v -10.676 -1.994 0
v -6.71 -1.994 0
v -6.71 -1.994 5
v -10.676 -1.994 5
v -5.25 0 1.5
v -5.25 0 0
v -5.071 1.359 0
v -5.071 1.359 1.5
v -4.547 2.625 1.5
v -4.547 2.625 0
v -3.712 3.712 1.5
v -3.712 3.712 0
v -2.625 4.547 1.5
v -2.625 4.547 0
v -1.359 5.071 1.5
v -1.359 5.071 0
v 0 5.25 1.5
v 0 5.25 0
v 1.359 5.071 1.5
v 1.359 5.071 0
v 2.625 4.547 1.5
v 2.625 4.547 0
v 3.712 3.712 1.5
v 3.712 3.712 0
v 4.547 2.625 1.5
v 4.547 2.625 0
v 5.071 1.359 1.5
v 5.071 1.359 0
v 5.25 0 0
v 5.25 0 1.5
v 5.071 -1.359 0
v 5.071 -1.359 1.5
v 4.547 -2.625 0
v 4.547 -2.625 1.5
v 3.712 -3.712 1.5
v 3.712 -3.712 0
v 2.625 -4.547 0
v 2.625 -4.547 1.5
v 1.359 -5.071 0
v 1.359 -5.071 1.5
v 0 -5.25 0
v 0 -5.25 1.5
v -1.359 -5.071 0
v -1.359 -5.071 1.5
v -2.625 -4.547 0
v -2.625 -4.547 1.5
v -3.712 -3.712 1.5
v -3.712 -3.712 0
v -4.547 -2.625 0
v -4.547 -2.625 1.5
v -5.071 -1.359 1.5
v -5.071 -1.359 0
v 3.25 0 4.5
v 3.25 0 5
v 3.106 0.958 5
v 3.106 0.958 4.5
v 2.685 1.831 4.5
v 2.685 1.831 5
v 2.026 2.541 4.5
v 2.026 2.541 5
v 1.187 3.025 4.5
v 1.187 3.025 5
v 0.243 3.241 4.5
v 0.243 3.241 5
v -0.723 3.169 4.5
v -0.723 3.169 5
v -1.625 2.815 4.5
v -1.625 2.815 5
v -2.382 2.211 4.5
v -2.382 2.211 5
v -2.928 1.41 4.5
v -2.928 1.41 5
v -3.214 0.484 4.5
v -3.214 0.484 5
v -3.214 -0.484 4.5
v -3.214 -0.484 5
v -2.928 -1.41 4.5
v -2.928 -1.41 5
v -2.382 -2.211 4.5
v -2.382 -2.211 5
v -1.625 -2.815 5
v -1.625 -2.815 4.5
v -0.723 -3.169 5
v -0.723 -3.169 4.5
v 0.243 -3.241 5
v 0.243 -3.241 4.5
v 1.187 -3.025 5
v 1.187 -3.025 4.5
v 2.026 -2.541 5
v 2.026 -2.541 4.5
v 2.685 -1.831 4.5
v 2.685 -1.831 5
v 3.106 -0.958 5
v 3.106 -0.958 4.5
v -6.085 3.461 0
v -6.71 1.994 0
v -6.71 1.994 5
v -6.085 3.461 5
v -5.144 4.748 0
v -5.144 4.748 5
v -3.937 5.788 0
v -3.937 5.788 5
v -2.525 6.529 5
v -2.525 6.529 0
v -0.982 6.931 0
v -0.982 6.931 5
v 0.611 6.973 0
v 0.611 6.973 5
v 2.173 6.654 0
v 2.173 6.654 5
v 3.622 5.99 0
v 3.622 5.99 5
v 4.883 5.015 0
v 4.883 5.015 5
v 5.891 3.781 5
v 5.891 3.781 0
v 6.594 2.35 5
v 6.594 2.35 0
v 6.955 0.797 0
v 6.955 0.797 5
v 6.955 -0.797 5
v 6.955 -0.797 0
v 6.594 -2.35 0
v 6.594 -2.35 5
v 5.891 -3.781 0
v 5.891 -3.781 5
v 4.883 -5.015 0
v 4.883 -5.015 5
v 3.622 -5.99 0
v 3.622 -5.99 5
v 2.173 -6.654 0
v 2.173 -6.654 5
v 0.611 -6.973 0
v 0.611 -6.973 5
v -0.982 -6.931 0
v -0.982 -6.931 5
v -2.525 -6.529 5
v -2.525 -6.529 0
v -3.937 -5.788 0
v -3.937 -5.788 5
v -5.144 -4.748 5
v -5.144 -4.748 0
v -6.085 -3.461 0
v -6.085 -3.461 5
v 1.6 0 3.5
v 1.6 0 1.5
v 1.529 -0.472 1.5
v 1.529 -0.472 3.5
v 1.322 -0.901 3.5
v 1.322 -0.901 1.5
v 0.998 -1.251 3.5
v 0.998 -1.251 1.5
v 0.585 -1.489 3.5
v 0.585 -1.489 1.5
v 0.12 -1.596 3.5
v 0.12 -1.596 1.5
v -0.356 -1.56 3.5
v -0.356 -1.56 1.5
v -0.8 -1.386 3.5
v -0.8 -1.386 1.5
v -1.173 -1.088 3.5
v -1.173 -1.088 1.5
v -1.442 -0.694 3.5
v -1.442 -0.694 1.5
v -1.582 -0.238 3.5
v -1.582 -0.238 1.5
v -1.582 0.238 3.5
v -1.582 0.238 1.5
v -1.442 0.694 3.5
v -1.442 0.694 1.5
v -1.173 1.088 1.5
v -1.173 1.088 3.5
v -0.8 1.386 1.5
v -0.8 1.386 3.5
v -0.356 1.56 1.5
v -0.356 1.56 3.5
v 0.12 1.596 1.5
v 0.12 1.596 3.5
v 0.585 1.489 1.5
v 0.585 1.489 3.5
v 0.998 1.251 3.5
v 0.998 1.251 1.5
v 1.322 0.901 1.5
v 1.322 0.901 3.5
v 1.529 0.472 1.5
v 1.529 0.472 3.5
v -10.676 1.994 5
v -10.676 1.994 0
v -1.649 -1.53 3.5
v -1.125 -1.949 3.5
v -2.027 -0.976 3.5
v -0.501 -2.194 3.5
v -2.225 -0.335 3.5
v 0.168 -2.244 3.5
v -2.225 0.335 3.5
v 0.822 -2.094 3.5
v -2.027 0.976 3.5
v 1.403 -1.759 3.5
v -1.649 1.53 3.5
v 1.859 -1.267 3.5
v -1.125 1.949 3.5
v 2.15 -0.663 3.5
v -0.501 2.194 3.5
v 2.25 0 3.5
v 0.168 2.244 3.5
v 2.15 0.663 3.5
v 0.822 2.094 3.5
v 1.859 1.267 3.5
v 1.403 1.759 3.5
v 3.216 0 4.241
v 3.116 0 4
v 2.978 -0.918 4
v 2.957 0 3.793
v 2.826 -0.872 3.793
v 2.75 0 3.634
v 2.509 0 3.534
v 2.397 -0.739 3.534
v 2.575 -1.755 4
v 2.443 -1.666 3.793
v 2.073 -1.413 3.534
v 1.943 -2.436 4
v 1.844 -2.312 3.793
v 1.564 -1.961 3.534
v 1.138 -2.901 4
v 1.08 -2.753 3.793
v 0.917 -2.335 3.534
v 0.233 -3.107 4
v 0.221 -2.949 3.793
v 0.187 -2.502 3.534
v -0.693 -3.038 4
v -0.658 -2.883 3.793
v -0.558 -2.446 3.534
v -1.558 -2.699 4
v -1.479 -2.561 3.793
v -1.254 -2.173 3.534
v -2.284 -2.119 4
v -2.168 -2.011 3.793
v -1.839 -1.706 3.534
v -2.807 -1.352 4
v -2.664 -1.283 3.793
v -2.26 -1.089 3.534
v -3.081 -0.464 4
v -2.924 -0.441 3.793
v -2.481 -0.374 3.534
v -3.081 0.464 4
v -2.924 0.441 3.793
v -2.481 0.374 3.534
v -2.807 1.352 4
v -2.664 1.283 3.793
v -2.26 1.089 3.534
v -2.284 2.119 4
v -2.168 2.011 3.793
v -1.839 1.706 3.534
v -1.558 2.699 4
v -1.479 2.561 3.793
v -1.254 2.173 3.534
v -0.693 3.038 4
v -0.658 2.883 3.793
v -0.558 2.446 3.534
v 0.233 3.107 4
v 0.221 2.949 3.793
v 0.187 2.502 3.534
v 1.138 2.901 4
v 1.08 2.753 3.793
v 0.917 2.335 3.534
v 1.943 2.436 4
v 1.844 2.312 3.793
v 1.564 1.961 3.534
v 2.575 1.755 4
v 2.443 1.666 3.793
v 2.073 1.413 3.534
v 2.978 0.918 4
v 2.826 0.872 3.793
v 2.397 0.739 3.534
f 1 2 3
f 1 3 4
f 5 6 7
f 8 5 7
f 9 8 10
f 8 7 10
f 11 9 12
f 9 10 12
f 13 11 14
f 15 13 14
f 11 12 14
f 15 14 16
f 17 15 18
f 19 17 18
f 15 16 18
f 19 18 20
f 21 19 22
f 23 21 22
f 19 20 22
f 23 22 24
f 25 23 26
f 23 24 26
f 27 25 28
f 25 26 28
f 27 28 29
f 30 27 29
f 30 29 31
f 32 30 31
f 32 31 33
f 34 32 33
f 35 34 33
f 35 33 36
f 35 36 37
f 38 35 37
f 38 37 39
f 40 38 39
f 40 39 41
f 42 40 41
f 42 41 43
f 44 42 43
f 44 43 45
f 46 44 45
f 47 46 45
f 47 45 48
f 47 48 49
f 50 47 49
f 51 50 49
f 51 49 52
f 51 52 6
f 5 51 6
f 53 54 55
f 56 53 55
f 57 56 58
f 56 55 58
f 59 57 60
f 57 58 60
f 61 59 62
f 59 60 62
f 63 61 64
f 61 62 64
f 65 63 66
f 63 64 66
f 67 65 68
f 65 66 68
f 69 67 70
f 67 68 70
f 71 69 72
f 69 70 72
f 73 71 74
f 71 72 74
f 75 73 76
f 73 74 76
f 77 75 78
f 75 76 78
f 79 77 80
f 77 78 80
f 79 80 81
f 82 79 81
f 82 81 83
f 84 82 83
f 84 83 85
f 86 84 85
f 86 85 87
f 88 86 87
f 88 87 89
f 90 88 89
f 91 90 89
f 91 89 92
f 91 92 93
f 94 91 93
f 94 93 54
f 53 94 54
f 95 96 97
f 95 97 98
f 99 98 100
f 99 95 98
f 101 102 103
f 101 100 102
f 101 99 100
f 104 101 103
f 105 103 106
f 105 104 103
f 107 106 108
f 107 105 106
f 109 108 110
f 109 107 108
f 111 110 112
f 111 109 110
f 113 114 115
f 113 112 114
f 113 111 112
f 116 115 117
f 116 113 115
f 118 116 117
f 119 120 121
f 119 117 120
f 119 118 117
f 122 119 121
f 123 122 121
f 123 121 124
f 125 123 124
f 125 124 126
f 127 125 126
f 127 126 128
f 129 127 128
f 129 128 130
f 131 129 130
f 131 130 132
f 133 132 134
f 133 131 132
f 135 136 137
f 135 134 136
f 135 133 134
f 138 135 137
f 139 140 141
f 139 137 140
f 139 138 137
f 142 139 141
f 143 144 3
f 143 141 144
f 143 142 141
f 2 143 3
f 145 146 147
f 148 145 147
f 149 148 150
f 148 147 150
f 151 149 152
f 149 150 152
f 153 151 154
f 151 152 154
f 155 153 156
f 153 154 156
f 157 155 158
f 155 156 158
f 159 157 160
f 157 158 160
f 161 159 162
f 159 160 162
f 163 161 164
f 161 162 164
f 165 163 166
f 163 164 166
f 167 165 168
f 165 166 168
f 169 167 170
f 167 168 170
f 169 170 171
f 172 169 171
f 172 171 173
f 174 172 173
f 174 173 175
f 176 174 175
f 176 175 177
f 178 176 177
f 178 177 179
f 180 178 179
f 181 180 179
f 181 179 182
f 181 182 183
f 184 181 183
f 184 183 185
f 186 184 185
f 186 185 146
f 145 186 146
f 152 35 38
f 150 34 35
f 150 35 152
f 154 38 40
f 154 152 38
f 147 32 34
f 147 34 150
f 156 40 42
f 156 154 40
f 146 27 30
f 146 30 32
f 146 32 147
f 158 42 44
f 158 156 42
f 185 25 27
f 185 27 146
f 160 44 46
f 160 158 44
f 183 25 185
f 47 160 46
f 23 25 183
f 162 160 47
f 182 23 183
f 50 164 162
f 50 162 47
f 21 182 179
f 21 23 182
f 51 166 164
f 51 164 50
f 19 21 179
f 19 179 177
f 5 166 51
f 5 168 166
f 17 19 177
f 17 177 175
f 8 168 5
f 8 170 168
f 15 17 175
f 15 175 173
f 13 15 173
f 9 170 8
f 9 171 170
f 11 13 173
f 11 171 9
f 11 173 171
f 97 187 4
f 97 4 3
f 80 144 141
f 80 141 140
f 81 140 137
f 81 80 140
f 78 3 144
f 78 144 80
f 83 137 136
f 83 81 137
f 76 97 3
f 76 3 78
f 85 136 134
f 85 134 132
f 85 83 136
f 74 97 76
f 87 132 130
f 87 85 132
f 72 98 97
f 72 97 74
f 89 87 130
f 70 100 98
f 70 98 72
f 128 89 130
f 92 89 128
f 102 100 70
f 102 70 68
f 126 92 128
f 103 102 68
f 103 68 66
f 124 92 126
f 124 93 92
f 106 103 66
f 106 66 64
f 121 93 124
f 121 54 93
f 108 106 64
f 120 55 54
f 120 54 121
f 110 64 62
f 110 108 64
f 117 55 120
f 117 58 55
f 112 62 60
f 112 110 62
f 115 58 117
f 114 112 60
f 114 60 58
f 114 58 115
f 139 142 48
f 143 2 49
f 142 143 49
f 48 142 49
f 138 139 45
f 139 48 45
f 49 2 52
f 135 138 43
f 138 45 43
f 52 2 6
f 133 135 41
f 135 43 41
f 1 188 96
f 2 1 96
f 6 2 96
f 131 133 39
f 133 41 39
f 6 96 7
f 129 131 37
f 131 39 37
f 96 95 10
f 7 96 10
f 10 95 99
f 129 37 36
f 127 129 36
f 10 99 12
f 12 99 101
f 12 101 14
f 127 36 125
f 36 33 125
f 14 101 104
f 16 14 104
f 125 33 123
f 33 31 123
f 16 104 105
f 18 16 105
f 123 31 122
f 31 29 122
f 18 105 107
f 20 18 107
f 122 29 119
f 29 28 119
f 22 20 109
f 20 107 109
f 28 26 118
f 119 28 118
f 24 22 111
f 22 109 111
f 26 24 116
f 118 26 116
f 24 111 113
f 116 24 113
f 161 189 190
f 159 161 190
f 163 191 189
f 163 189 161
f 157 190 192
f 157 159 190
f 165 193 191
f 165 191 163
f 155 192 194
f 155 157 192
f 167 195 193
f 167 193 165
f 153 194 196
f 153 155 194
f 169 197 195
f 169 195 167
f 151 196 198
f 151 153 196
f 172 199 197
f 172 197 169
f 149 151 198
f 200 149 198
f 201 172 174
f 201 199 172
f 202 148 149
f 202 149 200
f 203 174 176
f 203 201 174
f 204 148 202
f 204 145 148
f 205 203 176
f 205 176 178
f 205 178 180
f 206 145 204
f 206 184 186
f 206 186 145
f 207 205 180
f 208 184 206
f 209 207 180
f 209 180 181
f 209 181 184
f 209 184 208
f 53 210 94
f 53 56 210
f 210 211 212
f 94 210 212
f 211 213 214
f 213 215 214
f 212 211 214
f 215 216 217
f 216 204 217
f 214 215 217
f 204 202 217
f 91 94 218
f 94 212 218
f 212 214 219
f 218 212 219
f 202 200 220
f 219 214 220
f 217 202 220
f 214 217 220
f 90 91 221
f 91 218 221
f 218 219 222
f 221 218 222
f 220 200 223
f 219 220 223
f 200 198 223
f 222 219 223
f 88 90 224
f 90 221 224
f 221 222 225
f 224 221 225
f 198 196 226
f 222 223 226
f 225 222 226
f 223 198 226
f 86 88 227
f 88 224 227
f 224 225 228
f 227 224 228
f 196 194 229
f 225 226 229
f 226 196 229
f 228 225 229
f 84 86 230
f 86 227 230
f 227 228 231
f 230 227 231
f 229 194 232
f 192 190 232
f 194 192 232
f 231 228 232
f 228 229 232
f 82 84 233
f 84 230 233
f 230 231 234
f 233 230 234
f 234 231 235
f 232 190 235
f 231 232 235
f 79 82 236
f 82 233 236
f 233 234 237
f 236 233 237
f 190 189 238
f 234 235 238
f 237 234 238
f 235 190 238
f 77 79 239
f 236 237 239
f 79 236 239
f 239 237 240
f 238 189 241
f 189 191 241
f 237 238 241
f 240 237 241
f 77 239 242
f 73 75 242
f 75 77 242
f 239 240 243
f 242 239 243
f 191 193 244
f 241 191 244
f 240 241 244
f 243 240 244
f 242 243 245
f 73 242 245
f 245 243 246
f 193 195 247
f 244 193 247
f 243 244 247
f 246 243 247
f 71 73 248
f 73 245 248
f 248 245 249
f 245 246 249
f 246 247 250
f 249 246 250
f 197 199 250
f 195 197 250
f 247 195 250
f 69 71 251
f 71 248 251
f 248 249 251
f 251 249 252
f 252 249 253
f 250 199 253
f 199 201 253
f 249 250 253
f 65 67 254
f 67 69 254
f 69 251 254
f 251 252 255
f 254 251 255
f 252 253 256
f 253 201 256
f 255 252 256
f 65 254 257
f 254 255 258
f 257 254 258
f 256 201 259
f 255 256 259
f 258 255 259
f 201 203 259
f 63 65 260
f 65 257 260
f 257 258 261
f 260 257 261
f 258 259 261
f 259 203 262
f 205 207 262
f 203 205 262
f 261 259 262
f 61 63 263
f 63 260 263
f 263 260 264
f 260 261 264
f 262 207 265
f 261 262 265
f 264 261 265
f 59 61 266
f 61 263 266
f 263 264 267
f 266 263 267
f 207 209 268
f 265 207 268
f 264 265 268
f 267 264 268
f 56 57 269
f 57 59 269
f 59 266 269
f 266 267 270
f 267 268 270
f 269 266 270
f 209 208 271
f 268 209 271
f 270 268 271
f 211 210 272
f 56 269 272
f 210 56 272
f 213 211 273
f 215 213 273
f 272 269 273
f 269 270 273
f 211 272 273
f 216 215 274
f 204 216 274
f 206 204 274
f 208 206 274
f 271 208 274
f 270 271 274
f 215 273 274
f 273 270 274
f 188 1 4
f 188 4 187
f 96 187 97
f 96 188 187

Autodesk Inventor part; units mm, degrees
ref_plane "YZ Plane" through (0, 0, 0) normal (1, 0, 0) x (0, 1, 0)
ref_plane "XZ Plane" through (0, 0, 0) normal (0, 1, 0) x (-1, 0, 0)
ref_plane "XY Plane" through (0, 0, 0) normal (0, 0, 1) x (1, 0, 0)
sketch "草图1" plane through (0, 0, 0) normal (0, 0, 1) x (1, 0, 0)
  arc A0 (-6.7099, -1.9944) -> (-6.7099, 1.9944) centre (0, 0) ccw
  line L0 (-6.7099, -1.9944) -> (-10.6762, -1.9944)
  line L1 (-10.6762, -1.9944) -> (-10.6762, 1.9944)
  line L2 (-10.6762, 1.9944) -> (-6.7099, 1.9944)
  line L3 (-2.516, -5.9831) -> (-10.6762, 1.9944) construction
  line L4 (-10.6762, -1.9944) -> (-0.0773, -1.9944) construction
  circle A1 centre (0, 0) radius 1.6
  point P0 (-6.5961, -1.9944)
  dimension "d0" = 7
  dimension "d1" = 3.2
extrude "拉伸1" add sketch "草图1" along normal blind 5
sketch "草图2" plane through (0, 0, 0) normal (0, 0, -1) x (-1, 0, 0)
  circle A0 centre (0, 0) radius 5.25
  dimension "d4" = 10.5
extrude "拉伸2" cut sketch "草图2" against normal blind 1.5
sketch "草图3" plane through (0, 0, 5) normal (0, 0, 1) x (1, 0, 0)
  circle A0 centre (0, 0) radius 3.25
  dimension "d7" = 6.5
extrude "拉伸3" cut sketch "草图3" against normal blind 1.5
fillet "圆角1" radius 1 1 edges at (-3.25, 0, 3.5)
properties part number "编码器模型"
